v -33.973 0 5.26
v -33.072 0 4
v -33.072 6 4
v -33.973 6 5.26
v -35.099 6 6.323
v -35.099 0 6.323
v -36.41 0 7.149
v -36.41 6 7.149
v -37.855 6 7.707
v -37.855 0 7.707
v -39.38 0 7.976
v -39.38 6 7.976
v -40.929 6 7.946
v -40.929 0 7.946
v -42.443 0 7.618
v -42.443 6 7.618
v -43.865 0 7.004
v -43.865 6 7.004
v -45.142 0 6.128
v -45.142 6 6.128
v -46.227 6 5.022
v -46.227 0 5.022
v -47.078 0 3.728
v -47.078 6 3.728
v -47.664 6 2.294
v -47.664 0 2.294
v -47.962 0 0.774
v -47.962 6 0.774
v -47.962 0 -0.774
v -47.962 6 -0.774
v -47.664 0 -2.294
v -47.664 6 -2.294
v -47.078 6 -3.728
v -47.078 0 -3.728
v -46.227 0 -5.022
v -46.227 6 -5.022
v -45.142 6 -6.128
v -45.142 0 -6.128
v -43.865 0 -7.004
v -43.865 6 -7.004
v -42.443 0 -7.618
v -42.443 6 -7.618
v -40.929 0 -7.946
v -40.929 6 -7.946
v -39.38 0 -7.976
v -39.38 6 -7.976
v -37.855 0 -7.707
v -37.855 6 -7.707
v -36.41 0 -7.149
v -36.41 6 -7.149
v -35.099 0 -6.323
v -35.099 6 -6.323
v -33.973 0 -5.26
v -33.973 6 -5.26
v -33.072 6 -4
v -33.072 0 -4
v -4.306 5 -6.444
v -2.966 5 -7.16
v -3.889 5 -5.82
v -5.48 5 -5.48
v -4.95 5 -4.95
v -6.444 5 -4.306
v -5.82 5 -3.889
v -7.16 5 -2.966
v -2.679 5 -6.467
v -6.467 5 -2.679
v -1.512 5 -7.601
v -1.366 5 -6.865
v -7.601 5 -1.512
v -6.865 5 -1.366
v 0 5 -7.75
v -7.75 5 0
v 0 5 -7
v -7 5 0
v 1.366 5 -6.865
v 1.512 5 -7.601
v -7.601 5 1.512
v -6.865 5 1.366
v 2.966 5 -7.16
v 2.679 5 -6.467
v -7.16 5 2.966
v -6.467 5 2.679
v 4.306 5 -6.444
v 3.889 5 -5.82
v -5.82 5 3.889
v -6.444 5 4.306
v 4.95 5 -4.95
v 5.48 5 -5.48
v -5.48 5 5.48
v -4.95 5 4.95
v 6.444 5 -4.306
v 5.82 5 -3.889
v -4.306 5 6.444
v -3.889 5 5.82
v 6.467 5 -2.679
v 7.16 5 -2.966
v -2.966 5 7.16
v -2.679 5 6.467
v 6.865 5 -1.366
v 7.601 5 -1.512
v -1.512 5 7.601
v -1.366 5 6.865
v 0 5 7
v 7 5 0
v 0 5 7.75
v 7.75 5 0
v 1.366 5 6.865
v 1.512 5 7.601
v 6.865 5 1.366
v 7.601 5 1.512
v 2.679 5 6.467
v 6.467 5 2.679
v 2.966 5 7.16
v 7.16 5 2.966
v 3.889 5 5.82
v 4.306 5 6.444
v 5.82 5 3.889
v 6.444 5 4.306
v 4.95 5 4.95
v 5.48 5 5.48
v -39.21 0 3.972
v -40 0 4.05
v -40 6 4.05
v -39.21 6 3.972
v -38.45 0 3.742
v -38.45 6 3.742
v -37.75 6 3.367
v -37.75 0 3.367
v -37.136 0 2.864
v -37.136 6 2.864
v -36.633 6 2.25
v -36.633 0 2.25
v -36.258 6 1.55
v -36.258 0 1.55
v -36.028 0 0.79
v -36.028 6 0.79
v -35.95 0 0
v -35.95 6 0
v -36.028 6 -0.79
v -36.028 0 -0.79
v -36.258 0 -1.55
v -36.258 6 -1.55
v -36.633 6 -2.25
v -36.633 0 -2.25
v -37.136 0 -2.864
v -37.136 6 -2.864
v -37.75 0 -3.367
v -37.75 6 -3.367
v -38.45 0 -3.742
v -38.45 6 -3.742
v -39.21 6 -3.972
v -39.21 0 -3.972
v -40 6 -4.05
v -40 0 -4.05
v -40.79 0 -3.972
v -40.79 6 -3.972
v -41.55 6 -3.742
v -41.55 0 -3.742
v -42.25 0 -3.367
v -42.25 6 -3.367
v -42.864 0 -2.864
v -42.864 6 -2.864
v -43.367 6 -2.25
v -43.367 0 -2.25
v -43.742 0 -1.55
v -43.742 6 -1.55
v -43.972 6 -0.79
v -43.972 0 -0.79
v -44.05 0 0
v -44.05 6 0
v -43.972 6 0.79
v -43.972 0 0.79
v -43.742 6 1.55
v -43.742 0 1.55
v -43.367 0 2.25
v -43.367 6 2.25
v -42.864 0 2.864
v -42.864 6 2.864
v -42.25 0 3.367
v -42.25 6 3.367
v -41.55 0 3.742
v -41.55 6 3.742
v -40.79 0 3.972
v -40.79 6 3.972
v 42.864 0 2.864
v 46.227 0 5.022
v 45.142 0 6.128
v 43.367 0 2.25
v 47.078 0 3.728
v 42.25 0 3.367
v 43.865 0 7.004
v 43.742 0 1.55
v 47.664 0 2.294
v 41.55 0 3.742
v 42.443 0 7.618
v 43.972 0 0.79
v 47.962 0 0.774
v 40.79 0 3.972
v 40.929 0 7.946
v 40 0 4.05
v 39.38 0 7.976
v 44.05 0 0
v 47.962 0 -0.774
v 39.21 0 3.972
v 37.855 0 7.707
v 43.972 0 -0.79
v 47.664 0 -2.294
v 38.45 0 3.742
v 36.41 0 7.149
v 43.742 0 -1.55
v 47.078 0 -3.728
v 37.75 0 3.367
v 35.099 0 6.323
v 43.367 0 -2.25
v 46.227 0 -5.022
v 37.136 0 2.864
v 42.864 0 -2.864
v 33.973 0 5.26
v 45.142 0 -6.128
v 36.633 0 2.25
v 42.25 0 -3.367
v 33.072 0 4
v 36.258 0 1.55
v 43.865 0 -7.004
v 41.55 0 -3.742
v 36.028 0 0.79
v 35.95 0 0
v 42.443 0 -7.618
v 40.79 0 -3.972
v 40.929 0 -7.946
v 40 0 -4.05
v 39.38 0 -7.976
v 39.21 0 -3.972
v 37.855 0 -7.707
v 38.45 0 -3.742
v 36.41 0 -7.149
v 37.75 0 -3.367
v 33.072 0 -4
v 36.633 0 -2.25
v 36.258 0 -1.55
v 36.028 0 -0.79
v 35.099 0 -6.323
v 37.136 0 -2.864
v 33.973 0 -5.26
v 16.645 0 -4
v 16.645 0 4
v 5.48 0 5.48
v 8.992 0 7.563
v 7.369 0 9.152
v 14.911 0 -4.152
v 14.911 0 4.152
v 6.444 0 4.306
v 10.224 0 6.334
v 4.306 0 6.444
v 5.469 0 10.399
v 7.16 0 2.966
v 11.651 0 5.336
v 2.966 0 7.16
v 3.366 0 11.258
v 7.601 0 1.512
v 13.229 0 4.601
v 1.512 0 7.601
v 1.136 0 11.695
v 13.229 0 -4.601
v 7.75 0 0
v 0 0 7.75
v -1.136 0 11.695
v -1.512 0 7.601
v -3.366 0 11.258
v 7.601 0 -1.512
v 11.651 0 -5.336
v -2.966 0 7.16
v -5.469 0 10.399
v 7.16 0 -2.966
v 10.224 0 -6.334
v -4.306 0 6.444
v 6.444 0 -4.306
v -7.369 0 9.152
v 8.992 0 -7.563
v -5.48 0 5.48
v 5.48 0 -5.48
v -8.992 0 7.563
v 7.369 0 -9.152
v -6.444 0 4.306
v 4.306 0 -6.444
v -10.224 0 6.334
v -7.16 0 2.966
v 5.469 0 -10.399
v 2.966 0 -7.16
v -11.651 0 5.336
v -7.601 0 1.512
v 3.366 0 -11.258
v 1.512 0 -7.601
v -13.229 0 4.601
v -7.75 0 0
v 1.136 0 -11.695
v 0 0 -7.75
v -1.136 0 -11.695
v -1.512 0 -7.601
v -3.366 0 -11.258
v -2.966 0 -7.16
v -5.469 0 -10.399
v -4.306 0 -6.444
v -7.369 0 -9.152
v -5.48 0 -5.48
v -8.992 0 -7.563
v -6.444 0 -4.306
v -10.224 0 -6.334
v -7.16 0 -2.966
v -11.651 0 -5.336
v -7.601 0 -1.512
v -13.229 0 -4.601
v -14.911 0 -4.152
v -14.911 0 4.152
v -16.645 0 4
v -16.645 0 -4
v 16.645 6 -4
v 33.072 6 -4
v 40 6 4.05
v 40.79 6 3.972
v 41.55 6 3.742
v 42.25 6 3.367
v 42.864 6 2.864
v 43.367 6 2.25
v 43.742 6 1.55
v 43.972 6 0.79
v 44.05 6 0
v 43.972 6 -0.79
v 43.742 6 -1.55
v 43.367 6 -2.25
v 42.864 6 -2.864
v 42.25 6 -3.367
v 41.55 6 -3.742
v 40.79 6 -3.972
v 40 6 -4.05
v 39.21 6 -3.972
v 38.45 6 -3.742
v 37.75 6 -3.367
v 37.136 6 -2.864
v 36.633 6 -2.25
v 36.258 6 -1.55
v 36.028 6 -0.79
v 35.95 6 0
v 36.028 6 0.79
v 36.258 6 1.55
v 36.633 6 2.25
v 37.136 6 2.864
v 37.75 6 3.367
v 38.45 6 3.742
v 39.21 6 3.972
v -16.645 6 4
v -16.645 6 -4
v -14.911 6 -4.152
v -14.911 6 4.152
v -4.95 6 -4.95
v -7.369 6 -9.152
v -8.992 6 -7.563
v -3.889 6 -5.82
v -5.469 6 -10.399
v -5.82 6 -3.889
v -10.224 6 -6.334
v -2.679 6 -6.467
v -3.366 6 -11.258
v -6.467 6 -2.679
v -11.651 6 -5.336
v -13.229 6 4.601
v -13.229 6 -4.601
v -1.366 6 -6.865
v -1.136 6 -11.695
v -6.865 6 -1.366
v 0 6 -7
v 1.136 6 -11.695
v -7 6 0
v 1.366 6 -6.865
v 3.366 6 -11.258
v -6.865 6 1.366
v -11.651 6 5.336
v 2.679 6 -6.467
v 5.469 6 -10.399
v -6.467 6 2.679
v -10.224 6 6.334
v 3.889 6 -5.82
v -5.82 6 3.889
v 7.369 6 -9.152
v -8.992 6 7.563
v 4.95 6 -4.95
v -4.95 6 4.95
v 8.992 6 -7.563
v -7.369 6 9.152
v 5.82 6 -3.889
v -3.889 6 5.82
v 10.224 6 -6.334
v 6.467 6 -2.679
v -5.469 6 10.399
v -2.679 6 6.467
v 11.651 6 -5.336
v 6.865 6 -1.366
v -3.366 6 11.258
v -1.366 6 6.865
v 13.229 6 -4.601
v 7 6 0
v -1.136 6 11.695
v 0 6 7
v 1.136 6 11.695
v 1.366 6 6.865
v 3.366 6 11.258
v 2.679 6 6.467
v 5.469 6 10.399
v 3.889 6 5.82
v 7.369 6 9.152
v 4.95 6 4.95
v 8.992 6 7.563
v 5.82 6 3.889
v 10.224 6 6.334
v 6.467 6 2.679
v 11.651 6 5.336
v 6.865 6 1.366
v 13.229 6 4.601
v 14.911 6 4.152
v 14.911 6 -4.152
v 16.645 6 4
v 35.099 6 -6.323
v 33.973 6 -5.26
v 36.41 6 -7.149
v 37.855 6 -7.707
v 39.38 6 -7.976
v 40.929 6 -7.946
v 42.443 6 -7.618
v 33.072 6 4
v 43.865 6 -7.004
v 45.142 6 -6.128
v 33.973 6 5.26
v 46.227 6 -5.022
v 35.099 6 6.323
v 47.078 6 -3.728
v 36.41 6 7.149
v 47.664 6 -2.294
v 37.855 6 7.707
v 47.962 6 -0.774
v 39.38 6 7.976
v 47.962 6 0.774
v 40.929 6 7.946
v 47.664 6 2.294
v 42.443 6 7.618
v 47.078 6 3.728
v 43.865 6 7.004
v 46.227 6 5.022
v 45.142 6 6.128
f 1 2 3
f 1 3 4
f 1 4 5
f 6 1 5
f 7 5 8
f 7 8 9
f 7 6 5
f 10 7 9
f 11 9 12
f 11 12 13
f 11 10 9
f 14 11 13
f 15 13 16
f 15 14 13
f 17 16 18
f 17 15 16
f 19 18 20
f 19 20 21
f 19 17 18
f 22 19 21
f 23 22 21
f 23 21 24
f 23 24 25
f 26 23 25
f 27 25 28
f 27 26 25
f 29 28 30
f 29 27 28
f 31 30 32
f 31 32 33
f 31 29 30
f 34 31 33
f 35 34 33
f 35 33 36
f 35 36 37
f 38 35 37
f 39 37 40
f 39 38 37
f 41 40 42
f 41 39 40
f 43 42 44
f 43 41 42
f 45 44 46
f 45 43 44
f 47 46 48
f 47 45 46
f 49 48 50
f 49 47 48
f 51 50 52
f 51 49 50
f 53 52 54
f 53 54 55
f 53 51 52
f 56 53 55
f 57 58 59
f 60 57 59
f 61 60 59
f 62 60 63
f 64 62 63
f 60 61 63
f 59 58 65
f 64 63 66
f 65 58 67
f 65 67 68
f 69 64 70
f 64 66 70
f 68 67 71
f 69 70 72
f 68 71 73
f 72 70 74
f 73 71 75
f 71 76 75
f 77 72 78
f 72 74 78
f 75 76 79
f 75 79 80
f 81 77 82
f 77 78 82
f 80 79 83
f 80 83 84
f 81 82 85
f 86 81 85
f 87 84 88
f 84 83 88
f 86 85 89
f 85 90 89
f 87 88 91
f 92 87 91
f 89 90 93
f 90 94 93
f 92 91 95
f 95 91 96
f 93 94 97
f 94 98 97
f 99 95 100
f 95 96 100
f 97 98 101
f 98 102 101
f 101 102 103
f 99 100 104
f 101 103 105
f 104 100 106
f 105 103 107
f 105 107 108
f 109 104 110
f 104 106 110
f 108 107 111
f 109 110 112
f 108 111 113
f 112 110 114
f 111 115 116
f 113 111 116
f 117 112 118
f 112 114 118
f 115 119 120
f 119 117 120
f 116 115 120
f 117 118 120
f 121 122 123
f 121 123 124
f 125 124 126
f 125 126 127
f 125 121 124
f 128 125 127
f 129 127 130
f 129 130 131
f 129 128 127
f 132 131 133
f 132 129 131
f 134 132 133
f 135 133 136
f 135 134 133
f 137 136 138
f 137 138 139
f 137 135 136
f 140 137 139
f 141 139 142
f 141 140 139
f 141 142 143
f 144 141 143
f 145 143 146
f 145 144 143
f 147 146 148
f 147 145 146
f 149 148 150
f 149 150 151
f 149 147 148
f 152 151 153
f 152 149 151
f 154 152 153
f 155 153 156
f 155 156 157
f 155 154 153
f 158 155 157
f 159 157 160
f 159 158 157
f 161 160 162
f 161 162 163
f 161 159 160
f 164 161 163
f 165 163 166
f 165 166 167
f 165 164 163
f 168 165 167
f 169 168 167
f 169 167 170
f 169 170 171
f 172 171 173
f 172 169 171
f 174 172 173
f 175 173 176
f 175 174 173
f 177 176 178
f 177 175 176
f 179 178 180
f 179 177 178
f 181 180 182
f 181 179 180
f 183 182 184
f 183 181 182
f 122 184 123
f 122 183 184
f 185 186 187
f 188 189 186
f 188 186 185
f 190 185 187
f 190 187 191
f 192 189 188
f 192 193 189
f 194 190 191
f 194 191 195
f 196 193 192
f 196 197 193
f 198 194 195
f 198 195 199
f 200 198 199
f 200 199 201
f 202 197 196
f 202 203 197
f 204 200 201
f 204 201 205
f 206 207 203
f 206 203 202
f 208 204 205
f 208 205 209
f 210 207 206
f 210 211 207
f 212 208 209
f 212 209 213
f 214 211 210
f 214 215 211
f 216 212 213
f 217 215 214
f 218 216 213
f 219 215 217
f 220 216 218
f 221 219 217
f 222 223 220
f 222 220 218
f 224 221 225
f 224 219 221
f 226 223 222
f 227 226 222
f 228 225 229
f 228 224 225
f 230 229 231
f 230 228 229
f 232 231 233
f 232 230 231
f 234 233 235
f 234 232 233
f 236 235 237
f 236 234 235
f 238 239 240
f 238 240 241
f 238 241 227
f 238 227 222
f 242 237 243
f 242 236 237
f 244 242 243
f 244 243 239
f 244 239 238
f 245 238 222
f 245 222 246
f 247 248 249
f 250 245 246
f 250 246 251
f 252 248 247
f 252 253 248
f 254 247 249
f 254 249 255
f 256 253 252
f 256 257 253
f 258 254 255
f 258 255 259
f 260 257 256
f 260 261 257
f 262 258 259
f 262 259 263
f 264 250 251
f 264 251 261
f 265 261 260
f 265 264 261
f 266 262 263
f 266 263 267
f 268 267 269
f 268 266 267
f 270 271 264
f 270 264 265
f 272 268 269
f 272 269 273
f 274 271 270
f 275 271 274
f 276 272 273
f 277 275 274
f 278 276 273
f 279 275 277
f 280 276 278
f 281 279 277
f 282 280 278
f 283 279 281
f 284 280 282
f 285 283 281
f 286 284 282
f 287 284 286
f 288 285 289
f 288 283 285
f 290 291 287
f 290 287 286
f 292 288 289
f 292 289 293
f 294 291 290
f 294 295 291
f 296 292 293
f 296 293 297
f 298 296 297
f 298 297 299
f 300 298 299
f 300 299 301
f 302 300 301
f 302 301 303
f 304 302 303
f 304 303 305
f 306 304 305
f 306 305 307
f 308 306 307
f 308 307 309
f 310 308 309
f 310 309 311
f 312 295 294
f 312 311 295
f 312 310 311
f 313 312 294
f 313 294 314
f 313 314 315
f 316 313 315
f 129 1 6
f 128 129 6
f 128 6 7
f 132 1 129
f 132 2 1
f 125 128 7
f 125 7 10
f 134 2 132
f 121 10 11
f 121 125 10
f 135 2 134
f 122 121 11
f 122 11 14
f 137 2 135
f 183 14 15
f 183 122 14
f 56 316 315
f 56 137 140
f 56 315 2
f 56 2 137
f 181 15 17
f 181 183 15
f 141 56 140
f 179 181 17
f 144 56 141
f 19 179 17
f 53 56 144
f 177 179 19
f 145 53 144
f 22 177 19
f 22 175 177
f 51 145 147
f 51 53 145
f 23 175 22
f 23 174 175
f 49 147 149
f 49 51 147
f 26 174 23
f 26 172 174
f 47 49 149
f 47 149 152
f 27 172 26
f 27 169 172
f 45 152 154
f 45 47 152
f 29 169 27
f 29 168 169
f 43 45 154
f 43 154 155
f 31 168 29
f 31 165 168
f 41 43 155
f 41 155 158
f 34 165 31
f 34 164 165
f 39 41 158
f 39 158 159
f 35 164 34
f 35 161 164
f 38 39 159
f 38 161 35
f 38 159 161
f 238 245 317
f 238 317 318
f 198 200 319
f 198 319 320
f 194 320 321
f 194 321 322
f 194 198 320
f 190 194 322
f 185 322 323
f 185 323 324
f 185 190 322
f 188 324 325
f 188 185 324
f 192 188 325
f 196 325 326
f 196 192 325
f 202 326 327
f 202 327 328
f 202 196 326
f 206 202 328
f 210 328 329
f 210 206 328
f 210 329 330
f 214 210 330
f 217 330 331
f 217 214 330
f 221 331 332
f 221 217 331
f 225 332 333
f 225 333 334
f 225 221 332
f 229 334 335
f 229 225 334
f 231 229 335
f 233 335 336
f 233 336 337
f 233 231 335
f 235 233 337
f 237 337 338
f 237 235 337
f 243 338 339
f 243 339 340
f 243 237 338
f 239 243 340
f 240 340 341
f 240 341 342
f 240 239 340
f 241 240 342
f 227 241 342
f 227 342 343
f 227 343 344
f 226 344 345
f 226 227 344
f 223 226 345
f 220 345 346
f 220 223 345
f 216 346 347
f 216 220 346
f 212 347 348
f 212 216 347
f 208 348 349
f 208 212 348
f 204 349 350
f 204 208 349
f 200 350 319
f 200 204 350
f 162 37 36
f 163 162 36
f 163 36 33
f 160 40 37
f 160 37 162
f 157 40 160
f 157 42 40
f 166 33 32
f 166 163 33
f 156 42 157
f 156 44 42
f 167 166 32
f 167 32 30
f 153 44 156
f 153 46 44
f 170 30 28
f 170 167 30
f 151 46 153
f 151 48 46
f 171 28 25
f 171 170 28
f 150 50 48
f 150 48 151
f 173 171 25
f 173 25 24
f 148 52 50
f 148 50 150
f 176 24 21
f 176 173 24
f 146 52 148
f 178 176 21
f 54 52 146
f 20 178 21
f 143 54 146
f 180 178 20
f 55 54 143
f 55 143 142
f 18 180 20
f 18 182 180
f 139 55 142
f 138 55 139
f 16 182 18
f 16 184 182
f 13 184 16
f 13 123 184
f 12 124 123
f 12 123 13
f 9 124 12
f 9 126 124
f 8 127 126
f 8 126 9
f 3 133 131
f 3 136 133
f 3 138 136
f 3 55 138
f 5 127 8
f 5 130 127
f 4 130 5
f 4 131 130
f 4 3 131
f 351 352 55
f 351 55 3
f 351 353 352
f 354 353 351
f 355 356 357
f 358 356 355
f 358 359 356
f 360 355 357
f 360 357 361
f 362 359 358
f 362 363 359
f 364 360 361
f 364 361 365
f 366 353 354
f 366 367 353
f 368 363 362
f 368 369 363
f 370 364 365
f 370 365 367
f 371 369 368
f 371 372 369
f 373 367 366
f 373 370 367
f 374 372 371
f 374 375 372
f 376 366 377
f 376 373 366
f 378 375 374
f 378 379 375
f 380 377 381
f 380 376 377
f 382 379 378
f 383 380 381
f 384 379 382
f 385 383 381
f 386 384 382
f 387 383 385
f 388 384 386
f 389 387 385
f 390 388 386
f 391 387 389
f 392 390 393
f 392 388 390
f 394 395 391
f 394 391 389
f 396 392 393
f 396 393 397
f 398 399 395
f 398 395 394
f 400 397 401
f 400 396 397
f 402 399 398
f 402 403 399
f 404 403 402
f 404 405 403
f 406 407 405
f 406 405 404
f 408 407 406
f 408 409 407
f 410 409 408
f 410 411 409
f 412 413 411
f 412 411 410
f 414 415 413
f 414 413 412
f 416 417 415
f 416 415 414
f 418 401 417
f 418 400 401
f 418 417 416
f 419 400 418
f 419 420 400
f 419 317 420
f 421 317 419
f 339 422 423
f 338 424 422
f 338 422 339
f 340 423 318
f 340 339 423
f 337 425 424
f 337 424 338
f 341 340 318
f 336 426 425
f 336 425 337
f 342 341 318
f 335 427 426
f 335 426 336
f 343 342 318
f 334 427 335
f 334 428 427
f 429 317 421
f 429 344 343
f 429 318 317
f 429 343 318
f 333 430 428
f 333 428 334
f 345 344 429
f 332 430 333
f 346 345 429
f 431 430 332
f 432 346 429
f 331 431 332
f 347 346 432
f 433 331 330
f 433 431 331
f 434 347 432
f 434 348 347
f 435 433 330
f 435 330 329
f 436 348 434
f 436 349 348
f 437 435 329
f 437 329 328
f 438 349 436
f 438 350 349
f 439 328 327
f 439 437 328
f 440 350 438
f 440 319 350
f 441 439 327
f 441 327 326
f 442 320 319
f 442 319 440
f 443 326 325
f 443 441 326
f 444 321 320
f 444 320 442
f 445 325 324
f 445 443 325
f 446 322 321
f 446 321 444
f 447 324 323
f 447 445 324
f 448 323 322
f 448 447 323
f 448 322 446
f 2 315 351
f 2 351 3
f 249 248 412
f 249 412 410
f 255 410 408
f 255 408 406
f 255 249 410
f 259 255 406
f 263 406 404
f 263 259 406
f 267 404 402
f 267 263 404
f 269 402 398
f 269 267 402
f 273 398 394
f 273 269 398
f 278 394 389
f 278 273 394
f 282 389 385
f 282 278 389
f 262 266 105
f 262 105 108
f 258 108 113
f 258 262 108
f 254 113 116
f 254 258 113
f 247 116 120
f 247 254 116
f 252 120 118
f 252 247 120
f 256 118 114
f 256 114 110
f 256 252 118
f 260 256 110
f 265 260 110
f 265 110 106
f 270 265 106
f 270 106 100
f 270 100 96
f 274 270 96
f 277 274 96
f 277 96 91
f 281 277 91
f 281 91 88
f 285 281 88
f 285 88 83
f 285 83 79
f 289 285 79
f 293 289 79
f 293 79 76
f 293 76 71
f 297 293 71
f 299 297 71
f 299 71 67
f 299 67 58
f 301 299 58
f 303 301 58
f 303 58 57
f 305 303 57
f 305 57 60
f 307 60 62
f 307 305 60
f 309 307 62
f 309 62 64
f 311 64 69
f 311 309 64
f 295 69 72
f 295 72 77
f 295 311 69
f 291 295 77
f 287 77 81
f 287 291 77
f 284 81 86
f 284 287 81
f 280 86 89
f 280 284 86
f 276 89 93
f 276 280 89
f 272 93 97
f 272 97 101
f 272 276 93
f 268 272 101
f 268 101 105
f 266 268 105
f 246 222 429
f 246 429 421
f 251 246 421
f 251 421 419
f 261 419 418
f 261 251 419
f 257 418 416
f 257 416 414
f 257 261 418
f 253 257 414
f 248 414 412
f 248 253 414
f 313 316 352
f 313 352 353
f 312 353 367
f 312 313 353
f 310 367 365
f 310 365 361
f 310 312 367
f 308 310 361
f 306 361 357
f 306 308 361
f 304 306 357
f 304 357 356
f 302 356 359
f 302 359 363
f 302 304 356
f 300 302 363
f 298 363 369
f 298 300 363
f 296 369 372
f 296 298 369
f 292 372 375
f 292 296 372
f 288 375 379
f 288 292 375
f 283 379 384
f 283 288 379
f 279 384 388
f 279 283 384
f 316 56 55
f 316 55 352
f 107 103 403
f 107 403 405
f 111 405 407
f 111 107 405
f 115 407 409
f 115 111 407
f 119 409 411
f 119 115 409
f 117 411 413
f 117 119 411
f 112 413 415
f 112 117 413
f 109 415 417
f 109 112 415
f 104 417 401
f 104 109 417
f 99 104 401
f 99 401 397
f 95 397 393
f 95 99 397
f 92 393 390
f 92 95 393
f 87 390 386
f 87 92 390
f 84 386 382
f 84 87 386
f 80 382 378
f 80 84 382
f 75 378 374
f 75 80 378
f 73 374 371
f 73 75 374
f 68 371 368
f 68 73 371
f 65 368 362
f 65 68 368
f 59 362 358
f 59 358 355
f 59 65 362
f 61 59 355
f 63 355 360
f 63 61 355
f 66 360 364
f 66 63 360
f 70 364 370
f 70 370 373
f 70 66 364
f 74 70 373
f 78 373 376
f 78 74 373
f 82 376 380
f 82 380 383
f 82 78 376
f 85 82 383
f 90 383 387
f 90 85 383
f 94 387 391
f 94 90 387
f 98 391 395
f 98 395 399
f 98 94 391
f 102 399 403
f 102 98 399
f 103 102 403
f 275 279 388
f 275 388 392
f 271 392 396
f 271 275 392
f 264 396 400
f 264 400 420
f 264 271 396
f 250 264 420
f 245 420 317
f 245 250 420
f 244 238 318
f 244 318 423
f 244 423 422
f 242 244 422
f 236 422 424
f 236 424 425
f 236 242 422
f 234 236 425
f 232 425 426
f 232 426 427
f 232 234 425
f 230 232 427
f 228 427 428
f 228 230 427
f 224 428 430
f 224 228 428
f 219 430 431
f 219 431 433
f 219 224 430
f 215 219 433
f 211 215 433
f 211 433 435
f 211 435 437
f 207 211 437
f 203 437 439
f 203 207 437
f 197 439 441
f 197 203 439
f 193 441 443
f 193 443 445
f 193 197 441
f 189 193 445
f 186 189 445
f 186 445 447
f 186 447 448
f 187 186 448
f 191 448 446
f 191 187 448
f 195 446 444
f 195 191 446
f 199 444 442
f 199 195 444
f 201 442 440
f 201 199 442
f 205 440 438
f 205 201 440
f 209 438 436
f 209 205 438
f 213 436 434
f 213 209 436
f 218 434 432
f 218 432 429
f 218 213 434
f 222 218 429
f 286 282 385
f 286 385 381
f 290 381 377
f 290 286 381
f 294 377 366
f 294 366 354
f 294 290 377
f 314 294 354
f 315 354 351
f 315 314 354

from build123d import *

# Parameters (mm, degrees)
ESBO_O1_R                = 4.05
ESBO_O1_R_2              = 7.75
RESSALTO_EXTRUS_O1_DEPTH = 6
RESSALTO_EXTRUS_O2_START = -1
ESBO_O2_R                = 7.75
ESBO_O2_R_2              = 7
RESSALTO_EXTRUS_O2_DEPTH = 1


with BuildPart() as part:
    # Esboço1 → Ressalto-extrusão1 (new body)
    with BuildSketch(Plane(origin=(0, 0, 0), x_dir=(1, 0, 0), z_dir=(0, 1, 0))):
        with BuildLine():
            Line((-33.07179677, 4), (-16.645194502, 4))
            ThreePointArc((-16.645194502, 4), (-12.424283231, 4.934465926), (-8.992231512, 7.563218391))
            ThreePointArc((-8.992231512, 7.563218391), (0, 11.75), (8.992231512, 7.563218391))
            ThreePointArc((8.992231512, 7.563218391), (12.424283231, 4.934465926), (16.645194502, 4))
            Line((16.645194502, 4), (33.07179677, 4))
            ThreePointArc((33.07179677, 4), (48, 0), (33.07179677, -4))
            Line((33.07179677, -4), (16.645194502, -4))
            ThreePointArc((16.645194502, -4), (12.424283231, -4.934465926), (8.992231512, -7.563218391))
            ThreePointArc((8.992231512, -7.563218391), (0, -11.75), (-8.992231512, -7.563218391))
            ThreePointArc((-8.992231512, -7.563218391), (-12.424283231, -4.934465926), (-16.645194502, -4))
            Line((-16.645194502, -4), (-33.07179677, -4))
            ThreePointArc((-33.07179677, -4), (-48, 0), (-33.07179677, 4))
        make_face()
        with Locations(Location((40, 0, 0), (0, 0, 270))):
            Circle(ESBO_O1_R, mode=Mode.SUBTRACT)
        with Locations(Location((-40, 0, 0), (0, 0, 270))):
            Circle(ESBO_O1_R, mode=Mode.SUBTRACT)
        with Locations(Location((0, 0, 0), (0, 0, 270))):
            Circle(ESBO_O1_R_2, mode=Mode.SUBTRACT)
    extrude(amount=RESSALTO_EXTRUS_O1_DEPTH)

    # Esboço2 → Ressalto-extrusão2 (add)
    with BuildSketch(Plane(origin=(0, 6, 0), x_dir=(1, 0, 0), z_dir=(0, 1, 0)).offset(RESSALTO_EXTRUS_O2_START)):
        with Locations(Location((0, 0, 0), (0, 0, 270))):
            Circle(ESBO_O2_R)
        with Locations(Location((0, 0, 0), (0, 0, 270))):
            Circle(ESBO_O2_R_2, mode=Mode.SUBTRACT)
    extrude(amount=RESSALTO_EXTRUS_O2_DEPTH)


solid = part.part
